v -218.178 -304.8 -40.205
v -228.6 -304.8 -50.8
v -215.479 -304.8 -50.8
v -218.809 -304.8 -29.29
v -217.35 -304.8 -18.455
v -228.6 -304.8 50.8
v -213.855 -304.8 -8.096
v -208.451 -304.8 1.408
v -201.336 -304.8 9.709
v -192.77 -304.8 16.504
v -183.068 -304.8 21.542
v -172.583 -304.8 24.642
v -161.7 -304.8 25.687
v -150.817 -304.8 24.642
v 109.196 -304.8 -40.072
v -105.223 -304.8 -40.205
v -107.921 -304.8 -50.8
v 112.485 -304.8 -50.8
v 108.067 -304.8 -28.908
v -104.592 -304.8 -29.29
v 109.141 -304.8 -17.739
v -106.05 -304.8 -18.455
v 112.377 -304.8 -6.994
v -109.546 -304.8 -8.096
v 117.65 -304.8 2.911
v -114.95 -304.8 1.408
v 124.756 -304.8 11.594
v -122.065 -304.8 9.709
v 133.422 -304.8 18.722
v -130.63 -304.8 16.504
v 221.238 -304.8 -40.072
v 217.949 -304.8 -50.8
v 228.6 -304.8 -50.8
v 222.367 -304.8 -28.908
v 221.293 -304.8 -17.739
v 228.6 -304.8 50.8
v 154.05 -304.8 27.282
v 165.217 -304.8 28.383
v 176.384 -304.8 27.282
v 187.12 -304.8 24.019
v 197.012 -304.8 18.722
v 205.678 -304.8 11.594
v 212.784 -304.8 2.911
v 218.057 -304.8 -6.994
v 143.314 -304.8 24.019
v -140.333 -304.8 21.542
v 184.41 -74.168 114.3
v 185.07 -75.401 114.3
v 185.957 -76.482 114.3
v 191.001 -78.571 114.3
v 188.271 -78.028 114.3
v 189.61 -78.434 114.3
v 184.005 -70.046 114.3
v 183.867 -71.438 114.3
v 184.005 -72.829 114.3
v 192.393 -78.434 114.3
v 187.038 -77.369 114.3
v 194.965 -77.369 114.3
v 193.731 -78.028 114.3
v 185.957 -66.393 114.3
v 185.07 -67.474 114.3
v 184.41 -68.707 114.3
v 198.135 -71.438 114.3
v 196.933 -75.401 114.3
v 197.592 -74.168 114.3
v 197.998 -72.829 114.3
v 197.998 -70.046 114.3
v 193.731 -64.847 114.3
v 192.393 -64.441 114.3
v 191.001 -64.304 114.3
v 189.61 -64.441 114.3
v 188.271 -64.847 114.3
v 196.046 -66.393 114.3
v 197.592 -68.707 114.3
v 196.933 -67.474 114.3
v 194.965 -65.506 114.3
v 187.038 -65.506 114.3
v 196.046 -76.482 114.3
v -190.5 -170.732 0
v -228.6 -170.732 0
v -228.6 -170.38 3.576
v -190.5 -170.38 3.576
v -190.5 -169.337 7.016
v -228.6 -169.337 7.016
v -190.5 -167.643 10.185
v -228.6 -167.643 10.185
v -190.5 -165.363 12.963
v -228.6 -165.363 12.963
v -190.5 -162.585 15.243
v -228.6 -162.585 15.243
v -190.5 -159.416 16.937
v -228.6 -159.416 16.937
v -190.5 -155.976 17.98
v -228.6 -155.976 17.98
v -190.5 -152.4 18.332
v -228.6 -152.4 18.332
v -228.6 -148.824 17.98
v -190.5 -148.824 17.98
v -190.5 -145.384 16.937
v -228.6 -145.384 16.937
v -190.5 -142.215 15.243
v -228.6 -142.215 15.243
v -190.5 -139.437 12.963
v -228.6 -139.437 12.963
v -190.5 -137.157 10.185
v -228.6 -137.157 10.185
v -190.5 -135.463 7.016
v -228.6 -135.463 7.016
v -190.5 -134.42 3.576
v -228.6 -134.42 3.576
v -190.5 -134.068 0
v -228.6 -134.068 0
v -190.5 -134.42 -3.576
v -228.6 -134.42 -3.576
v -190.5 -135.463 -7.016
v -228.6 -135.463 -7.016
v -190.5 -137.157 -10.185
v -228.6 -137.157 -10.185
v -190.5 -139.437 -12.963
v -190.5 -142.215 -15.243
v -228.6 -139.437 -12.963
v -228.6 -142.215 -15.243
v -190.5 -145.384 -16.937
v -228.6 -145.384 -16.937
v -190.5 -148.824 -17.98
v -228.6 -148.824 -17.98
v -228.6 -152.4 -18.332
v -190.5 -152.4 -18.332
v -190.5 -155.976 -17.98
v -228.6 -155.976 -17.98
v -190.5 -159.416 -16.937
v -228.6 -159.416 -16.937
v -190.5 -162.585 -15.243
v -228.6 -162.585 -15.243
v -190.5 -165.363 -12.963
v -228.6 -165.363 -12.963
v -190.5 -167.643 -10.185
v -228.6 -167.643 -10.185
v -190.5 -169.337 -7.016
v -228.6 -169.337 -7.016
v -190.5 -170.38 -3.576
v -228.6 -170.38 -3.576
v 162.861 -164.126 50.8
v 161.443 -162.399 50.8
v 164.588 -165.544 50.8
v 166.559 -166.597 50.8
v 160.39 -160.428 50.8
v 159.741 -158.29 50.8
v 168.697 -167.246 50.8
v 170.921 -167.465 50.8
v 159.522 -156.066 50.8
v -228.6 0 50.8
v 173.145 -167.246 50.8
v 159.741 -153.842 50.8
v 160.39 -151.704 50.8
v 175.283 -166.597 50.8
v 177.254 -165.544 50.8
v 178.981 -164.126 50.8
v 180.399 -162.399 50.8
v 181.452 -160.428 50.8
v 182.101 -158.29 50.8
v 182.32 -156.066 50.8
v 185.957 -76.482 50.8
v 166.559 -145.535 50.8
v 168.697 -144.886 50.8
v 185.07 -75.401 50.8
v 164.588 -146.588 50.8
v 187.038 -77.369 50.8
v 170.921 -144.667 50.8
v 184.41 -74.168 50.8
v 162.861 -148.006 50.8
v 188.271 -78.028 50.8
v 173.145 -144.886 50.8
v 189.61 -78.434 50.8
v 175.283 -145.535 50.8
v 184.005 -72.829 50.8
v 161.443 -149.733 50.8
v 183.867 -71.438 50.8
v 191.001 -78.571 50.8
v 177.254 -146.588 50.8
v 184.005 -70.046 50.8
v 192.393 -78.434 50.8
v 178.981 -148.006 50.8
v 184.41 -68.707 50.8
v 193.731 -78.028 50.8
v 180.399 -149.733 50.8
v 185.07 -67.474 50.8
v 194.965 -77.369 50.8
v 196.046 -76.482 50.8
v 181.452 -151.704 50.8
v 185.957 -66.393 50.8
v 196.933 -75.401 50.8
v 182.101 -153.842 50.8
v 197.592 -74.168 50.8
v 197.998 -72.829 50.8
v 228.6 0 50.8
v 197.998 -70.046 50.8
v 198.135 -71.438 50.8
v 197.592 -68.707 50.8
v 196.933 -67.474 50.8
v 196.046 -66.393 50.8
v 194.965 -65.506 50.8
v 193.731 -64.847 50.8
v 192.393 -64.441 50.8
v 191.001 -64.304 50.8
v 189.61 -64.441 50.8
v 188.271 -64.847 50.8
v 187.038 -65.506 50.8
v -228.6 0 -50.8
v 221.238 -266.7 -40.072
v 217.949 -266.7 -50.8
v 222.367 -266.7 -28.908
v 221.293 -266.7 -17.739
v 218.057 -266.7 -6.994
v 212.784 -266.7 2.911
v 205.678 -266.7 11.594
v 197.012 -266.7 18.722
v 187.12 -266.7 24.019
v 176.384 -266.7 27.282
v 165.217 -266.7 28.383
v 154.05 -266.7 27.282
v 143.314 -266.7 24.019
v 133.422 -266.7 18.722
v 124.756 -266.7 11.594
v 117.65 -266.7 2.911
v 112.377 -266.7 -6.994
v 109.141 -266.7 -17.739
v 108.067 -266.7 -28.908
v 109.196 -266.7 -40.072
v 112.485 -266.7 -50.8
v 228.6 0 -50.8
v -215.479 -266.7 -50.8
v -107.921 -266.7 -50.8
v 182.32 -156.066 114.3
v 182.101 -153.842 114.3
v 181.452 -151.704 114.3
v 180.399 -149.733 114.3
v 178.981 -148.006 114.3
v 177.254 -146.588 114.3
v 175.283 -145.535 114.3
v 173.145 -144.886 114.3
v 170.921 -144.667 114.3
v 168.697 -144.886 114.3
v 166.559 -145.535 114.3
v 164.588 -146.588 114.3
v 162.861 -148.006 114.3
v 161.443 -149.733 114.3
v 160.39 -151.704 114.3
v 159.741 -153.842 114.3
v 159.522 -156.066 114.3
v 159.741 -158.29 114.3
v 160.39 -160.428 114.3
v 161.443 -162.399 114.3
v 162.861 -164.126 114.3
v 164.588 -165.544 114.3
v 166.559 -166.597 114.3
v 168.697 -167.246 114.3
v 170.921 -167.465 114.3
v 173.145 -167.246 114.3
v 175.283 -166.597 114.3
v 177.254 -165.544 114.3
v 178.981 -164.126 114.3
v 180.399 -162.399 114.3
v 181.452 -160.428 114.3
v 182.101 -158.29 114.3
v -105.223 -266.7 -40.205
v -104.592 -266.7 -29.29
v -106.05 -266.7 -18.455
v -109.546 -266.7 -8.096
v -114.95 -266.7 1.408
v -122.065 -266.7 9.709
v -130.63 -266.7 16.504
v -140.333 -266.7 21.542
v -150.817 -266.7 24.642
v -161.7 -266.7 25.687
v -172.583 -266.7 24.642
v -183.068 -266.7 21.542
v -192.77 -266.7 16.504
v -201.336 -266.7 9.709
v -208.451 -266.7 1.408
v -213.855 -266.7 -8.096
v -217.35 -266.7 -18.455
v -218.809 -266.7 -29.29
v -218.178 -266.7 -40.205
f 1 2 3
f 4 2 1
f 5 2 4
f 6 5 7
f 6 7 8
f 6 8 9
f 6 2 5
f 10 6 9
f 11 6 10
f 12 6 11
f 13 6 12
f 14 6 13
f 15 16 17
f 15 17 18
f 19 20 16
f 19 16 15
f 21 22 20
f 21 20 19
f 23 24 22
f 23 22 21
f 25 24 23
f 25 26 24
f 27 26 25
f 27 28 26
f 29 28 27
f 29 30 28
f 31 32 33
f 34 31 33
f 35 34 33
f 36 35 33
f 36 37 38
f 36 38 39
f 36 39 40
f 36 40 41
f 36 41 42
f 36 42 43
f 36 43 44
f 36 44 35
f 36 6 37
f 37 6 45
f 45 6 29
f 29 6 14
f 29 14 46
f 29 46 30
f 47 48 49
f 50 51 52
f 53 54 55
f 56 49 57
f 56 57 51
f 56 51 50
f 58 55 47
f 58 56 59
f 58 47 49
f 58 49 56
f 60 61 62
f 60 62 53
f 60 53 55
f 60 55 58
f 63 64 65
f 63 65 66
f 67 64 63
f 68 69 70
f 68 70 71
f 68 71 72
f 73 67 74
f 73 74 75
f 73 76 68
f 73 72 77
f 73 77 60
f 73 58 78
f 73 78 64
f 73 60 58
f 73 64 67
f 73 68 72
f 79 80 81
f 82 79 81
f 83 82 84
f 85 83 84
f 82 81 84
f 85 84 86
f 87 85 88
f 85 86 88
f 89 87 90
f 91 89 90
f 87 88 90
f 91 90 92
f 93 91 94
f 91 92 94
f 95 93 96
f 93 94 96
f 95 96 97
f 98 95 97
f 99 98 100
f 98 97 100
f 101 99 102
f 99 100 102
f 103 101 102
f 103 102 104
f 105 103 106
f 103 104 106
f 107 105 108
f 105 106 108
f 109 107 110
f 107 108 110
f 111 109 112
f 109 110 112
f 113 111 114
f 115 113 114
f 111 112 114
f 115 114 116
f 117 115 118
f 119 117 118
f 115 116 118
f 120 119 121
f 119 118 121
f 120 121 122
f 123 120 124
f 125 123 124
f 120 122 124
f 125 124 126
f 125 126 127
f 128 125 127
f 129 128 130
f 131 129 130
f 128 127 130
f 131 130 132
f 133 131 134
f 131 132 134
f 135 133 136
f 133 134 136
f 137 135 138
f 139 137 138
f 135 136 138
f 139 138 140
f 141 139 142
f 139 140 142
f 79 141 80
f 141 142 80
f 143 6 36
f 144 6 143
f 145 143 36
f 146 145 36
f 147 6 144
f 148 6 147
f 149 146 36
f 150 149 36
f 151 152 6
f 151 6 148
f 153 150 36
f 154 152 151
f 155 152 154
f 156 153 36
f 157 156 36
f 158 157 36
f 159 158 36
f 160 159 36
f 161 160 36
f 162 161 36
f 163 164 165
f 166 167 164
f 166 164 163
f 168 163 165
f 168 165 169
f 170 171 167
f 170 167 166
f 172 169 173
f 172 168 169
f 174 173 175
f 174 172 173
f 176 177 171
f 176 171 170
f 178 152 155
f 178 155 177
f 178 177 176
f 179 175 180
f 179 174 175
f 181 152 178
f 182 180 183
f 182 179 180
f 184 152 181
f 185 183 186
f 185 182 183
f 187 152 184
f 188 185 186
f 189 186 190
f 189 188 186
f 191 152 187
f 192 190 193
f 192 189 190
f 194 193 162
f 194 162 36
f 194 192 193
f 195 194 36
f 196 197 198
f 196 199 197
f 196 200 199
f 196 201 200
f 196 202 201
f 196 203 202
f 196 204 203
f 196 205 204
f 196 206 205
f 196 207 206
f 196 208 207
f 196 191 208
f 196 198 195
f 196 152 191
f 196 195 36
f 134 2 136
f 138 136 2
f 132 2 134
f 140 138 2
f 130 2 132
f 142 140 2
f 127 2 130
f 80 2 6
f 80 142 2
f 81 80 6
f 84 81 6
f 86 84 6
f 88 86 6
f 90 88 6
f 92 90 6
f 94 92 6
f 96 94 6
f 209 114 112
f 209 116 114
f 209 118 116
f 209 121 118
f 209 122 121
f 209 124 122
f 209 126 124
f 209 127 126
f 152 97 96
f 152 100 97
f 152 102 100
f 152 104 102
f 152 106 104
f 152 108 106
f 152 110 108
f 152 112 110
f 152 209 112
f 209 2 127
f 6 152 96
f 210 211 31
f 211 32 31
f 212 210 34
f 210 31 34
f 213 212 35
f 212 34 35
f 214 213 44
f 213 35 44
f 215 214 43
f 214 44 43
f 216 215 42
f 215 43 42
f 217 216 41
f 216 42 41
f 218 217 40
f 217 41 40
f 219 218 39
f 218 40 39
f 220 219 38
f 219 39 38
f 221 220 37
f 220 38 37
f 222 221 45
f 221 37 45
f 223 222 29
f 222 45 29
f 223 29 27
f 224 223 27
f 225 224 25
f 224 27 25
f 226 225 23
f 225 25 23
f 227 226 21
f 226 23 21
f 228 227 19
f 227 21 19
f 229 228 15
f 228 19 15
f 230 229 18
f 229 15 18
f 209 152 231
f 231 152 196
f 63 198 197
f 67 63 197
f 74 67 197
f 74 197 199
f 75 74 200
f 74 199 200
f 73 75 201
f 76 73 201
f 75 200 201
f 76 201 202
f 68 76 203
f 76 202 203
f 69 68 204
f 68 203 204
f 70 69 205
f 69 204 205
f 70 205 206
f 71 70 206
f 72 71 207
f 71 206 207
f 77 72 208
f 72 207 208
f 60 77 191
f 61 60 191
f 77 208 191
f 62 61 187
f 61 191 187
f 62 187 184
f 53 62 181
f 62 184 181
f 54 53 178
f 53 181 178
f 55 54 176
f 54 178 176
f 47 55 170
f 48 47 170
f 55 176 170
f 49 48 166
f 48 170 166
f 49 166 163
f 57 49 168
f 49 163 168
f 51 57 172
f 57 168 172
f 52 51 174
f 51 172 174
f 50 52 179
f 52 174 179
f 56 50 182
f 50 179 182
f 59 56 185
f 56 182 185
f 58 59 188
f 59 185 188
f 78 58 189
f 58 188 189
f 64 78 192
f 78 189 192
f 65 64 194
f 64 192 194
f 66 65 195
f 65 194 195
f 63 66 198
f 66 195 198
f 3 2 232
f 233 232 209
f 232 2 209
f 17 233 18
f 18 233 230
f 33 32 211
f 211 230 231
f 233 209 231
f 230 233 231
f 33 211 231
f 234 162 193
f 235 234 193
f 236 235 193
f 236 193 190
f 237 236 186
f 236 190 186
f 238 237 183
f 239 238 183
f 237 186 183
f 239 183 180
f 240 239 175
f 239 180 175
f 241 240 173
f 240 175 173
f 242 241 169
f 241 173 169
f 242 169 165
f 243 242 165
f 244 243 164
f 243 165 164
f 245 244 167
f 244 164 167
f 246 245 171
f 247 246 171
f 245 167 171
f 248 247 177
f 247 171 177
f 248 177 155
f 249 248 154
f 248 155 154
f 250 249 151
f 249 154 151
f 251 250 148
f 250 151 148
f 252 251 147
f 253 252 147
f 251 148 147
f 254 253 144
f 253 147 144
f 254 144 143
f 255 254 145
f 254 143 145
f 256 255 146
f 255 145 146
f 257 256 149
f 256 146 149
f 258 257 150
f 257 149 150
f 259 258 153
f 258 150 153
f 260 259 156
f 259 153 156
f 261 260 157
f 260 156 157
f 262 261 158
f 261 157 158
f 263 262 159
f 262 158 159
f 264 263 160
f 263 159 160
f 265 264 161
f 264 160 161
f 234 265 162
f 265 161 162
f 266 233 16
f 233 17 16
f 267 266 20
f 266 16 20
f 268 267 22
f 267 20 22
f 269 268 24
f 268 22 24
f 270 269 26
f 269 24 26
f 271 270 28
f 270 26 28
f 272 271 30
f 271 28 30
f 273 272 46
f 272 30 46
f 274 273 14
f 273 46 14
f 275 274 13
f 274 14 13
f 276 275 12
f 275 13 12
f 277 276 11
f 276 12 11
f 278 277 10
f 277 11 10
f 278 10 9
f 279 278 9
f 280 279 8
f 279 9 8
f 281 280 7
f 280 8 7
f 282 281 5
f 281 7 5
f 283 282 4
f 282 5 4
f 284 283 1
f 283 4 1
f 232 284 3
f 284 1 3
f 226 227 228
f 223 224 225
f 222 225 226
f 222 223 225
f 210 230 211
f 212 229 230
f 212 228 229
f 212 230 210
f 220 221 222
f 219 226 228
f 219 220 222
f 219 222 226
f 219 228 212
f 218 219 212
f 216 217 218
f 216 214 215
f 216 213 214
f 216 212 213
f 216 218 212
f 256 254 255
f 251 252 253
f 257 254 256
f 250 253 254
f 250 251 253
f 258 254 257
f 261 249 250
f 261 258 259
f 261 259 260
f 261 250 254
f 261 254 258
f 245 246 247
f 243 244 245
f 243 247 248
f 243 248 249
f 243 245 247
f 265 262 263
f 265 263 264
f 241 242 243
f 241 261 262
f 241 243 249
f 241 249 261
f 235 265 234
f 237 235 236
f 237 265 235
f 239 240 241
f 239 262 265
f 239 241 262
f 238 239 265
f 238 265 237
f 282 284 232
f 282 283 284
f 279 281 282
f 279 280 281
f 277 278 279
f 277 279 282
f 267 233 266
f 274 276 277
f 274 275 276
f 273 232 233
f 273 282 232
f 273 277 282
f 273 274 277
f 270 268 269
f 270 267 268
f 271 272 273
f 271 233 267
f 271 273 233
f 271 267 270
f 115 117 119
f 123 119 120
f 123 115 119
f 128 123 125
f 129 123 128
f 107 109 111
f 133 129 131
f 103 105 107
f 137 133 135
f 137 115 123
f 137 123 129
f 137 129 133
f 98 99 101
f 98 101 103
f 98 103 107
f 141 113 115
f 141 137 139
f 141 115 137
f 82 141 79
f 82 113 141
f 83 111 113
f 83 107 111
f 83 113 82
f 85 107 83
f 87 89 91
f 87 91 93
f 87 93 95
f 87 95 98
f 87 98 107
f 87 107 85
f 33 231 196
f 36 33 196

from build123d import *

# Parameters (mm, degrees)
F0_W     = 457.2
F0_H     = 101.6
F1_DEPTH = 304.8
F2_R     = 57.15
F3_DEPTH = 38.1
F4_R     = 7.133851
F4_R_2   = 11.398645
F5_DEPTH = 63.5
F6_DEPTH = 63.5
F7_R     = 18.332449
F8_DEPTH = 38.1


with BuildPart() as f1:
    # F0 (on Front) → F1 (new body)
    with BuildSketch(Plane.XZ):
        Rectangle(F0_W, F0_H)
    extrude(amount=F1_DEPTH)

    # F2 (on face) → F3 (cut)
    with BuildSketch(Plane.XZ.offset(304.8)):
        with Locations((-161.700301, -31.462707)):
            Circle(F2_R)
        with Locations((165.217001, -28.766797)):
            Circle(F2_R)
    extrude(amount=-F3_DEPTH, mode=Mode.SUBTRACT)

    # F4 (on face) → F5 (join)
    with BuildSketch(Plane.XY.offset(50.8)):
        with Locations((191.001311, -71.4375)):
            Circle(F4_R)
        with Locations((170.921057, -156.06603)):
            Circle(F4_R_2)
    extrude(amount=F5_DEPTH)

    # F4 (on face) → F6 (join)
    with BuildSketch(Plane.XY.offset(50.8)):
        with Locations((191.001311, -71.4375)):
            Circle(F4_R)
        with Locations((170.921057, -156.06603)):
            Circle(F4_R_2)
    extrude(amount=F6_DEPTH)

    # F7 (on face) → F8 (cut)
    with BuildSketch(Plane(origin=(-228.6, 0, 0), x_dir=(0, -1, 0), z_dir=(-1, 0, 0))):
        with Locations((152.4, 0)):
            Circle(F7_R)
    extrude(amount=-F8_DEPTH, mode=Mode.SUBTRACT)


solid = f1.part
